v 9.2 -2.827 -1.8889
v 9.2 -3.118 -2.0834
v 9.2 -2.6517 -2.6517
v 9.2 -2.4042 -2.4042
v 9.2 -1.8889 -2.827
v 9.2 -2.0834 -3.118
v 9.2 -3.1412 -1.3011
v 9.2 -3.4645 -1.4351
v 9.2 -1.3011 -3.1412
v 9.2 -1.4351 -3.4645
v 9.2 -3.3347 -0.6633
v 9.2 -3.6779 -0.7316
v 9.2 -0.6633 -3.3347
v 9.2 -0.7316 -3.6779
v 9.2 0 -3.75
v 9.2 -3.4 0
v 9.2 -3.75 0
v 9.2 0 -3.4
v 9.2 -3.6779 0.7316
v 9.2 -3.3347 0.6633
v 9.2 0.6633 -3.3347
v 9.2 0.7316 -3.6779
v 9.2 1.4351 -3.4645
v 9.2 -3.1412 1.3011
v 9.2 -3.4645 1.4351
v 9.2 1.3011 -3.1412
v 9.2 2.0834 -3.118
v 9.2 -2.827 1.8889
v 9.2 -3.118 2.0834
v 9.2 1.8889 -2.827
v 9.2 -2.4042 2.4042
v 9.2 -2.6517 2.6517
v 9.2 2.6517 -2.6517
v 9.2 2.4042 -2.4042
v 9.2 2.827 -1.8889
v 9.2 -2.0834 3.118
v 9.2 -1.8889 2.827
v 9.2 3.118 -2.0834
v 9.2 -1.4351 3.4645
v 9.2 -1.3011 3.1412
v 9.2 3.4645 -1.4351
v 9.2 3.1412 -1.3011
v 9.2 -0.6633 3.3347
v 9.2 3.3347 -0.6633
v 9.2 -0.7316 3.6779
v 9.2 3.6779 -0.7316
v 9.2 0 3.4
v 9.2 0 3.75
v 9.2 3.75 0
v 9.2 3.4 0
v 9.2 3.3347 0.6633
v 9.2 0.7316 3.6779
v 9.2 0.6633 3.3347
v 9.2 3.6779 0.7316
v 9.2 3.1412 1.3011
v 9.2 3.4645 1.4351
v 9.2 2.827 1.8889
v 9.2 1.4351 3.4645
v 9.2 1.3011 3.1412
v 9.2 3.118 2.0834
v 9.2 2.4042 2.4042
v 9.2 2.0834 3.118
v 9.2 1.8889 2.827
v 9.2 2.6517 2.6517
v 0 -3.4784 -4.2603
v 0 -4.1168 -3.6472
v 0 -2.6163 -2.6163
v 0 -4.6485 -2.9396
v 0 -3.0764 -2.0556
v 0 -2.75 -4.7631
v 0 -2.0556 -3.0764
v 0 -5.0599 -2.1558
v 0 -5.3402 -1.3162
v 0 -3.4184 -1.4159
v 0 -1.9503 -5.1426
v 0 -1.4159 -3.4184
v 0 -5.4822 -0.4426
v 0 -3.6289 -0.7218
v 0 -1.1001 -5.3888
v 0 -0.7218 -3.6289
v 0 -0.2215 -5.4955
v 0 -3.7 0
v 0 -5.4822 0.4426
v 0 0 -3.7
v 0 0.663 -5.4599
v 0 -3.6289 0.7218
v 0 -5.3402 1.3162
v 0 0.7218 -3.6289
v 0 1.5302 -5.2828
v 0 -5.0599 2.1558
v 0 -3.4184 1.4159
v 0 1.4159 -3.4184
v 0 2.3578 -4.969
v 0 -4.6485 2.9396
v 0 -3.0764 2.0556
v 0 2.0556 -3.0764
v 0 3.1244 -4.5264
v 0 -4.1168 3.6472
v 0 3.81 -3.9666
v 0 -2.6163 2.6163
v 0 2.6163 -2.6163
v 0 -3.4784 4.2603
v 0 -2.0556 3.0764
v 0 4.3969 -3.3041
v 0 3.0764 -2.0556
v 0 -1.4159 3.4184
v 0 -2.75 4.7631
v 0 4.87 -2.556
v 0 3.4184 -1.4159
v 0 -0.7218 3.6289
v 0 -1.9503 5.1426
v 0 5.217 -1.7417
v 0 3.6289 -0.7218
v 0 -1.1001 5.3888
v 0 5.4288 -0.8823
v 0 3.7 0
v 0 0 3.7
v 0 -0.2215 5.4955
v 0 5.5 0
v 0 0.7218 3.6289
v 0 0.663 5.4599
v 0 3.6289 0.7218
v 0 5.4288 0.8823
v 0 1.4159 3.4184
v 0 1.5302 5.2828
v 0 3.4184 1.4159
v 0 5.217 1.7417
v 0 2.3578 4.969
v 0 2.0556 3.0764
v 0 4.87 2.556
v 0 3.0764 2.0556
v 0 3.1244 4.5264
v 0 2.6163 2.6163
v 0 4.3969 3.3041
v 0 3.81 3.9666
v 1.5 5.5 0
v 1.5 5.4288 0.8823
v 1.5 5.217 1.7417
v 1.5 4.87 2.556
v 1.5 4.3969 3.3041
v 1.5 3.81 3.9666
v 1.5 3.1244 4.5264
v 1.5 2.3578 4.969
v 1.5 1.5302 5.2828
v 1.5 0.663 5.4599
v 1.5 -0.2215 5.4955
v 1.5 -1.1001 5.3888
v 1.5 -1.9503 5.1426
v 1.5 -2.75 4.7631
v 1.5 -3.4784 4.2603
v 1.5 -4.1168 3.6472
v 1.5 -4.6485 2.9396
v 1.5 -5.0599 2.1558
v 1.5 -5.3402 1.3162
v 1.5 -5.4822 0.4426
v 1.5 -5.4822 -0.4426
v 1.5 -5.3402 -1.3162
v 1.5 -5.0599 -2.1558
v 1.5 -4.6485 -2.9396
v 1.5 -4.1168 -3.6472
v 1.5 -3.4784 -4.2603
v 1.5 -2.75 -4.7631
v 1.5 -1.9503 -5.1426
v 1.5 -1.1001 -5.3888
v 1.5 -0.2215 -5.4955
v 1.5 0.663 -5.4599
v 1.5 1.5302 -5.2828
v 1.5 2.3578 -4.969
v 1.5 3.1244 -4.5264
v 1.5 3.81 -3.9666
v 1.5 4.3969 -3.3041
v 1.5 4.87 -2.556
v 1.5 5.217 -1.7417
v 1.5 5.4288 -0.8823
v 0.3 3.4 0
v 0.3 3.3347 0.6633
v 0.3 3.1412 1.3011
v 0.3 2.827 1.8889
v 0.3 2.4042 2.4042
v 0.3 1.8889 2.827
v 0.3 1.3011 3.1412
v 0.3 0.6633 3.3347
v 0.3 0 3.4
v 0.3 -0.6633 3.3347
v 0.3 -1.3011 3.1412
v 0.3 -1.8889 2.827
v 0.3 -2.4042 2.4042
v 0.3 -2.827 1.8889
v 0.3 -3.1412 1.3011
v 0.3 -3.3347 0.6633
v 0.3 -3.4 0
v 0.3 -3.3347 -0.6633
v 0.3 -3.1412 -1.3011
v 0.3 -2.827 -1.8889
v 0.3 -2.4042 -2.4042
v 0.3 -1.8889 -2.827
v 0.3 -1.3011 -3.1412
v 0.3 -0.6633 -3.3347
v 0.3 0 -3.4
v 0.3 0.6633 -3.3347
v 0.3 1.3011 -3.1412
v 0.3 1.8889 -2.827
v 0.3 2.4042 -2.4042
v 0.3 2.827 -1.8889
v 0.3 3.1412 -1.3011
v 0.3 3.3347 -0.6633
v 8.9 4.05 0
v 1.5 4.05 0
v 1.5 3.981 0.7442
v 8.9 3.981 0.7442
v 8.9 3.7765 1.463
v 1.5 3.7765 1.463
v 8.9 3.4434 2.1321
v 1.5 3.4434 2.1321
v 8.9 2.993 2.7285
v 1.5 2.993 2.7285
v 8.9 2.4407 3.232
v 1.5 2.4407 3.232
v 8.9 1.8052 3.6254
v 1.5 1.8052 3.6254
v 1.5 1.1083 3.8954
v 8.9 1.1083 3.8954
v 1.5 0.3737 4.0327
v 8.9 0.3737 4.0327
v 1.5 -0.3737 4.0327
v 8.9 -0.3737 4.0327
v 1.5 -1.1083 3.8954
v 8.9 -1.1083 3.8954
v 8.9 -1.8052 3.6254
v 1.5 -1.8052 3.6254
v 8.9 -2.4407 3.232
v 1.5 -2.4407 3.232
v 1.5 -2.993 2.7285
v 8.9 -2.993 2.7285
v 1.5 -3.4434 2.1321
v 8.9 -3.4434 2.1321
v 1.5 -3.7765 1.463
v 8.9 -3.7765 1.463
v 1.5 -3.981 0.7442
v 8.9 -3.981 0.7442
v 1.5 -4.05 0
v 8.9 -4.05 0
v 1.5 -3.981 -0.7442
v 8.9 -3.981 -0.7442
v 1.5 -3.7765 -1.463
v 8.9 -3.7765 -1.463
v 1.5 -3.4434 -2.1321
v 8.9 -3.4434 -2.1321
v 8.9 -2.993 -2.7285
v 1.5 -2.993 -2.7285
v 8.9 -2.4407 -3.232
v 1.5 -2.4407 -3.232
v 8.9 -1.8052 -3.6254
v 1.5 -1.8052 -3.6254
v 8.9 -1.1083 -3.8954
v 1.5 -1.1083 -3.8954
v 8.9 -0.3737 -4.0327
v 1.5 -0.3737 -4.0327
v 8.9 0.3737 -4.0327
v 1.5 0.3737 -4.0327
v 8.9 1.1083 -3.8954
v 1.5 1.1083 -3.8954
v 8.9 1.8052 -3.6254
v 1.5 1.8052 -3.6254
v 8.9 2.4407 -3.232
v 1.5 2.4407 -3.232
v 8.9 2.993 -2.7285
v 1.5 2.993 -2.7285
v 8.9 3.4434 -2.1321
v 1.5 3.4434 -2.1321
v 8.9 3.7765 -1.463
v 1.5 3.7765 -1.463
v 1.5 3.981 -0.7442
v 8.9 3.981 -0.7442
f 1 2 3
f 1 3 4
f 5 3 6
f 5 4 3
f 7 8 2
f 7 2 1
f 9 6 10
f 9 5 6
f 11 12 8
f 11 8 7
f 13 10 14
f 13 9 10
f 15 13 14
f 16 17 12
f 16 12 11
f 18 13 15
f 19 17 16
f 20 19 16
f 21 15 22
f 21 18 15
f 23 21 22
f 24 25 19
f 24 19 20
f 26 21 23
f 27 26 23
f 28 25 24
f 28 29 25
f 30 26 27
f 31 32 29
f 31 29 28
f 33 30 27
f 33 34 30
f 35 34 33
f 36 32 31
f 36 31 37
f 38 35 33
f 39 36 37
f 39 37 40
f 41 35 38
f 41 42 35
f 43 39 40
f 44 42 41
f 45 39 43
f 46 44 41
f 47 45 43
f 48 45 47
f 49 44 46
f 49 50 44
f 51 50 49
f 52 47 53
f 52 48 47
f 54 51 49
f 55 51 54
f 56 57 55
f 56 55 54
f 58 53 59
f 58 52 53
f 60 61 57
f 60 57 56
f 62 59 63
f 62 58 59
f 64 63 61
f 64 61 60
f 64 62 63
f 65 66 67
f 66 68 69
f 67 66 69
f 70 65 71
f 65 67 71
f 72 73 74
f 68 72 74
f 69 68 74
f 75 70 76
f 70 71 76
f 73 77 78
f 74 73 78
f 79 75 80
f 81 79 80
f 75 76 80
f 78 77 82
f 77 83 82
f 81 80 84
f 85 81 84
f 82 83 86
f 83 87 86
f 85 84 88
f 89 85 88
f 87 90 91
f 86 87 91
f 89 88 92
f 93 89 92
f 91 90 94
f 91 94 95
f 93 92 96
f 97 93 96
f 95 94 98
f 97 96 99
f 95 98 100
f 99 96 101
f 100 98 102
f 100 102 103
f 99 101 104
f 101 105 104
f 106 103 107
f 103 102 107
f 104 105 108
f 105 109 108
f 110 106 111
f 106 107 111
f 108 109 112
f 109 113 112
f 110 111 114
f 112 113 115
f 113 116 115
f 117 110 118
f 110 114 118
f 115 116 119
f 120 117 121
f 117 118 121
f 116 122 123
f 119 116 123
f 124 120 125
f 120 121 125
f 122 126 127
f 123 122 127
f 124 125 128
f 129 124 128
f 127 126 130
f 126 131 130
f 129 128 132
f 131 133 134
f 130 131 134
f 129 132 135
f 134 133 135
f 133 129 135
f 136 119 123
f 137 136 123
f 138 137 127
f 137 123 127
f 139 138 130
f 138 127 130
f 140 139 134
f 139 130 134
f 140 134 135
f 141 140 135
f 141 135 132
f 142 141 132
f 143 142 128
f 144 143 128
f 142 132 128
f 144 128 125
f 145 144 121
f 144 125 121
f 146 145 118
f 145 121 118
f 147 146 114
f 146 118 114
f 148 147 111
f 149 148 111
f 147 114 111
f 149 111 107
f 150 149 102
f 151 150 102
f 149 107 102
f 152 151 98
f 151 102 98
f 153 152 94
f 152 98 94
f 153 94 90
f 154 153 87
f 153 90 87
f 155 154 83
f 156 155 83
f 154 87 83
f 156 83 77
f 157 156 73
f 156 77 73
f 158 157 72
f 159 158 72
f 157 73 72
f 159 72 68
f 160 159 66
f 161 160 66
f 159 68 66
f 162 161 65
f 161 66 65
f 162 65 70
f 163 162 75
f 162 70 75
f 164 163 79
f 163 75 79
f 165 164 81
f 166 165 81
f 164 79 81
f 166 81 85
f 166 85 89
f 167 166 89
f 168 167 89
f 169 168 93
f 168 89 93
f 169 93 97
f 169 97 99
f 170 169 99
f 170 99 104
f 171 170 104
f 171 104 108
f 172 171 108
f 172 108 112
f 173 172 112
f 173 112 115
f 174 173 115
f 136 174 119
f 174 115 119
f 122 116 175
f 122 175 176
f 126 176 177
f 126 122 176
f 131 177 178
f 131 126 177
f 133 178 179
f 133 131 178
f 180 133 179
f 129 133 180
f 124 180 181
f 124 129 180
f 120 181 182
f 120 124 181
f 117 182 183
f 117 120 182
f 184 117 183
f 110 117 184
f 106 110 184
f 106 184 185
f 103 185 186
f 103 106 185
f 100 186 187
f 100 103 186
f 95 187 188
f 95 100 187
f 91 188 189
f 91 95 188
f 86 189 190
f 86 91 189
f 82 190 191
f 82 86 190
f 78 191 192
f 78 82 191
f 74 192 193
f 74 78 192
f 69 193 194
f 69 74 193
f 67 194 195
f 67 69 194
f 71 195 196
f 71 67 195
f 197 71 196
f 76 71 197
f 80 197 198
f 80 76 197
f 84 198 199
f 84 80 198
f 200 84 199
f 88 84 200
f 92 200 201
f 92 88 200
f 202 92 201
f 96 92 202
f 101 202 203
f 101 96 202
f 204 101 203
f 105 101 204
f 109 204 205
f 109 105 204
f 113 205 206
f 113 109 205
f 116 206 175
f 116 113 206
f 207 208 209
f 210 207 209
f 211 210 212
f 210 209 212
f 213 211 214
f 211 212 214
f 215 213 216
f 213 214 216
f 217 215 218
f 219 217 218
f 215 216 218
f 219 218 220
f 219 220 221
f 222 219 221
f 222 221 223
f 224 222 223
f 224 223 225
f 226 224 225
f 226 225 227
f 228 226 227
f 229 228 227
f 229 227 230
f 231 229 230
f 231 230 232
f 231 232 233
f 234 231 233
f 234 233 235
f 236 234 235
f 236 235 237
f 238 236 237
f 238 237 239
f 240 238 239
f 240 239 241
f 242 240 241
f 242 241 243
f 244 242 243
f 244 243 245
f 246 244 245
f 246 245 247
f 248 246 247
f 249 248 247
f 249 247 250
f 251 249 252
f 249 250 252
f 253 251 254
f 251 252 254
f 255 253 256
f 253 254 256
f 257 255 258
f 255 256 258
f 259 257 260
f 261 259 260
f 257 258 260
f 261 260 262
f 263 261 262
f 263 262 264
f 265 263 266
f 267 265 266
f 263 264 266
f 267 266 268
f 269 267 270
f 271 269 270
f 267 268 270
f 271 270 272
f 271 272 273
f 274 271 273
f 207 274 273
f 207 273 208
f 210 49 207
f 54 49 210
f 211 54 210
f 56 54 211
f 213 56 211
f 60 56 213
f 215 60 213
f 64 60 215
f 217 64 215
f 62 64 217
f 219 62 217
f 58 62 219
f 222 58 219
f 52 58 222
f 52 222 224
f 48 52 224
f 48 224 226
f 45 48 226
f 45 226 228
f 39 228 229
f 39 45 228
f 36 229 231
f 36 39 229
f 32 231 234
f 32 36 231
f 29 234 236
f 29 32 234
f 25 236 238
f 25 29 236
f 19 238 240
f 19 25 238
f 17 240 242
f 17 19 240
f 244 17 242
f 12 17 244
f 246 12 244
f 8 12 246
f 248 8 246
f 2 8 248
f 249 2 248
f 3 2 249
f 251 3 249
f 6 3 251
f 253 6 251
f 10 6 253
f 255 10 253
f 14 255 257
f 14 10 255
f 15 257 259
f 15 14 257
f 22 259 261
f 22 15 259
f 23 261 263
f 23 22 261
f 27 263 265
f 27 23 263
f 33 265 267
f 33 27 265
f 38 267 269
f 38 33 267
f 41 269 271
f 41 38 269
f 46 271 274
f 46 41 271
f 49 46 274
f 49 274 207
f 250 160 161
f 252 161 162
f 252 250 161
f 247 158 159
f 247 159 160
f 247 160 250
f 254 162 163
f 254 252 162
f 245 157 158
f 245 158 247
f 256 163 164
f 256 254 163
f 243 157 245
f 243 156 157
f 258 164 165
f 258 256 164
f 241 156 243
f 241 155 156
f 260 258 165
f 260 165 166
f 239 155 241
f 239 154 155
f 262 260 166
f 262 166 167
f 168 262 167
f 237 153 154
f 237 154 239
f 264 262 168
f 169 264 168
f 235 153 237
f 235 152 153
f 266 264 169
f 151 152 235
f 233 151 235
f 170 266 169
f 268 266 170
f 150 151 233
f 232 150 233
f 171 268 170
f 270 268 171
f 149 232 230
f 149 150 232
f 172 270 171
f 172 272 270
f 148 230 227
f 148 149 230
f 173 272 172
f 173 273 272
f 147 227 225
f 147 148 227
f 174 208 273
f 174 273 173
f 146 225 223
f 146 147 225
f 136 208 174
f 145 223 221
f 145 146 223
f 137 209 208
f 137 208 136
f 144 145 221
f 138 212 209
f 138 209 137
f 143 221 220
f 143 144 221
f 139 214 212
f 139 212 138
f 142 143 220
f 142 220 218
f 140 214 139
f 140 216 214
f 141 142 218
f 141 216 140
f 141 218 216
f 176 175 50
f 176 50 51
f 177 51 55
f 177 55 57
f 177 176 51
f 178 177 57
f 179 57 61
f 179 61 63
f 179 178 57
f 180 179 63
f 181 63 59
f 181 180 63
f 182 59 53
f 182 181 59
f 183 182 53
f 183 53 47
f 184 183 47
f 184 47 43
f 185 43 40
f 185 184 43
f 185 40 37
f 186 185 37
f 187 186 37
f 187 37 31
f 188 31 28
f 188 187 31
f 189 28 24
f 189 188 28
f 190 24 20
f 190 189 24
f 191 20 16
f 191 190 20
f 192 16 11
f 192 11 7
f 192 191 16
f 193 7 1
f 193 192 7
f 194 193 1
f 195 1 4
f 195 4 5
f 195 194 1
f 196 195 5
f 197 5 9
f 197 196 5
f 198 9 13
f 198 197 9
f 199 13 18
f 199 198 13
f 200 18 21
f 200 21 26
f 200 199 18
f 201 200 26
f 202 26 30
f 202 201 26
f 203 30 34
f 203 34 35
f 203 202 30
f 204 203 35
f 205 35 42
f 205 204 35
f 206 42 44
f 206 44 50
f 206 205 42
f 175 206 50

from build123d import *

# Parameters (mm, degrees)
F0_R     = 4.05
F0_R_2   = 3.4
F0_R_3   = 5.5
F1_DEPTH = 1.5
F2_DEPTH = 9.2
F3_DEPTH = 9.201
F4_SIZE  = 0.3


with BuildPart() as f1:
    # F0 (on Right) → F1 (new body)
    with BuildSketch(Plane.YZ):
        Circle(F0_R)
        Circle(F0_R_2, mode=Mode.SUBTRACT)
        Circle(F0_R_2)
        Circle(F0_R_3)
        Circle(F0_R, mode=Mode.SUBTRACT)
    extrude(amount=F1_DEPTH)

    # F0 (on Right) → F2 (join)
    with BuildSketch(Plane.YZ):
        Circle(F0_R)
        Circle(F0_R_2, mode=Mode.SUBTRACT)
    extrude(amount=F2_DEPTH)

    # F0 (on Right) → F3 (cut, through all)
    with BuildSketch(Plane.YZ):
        Circle(F0_R_2)
    extrude(amount=F3_DEPTH, mode=Mode.SUBTRACT)

    # F4
    f4_edges = [f1.edges().sort_by_distance(p)[0] for p in [
        (0, -3.4, 0),
        (9.2, -4.05, 0),
    ]]
    chamfer(f4_edges, length=F4_SIZE)


solid = f1.part
